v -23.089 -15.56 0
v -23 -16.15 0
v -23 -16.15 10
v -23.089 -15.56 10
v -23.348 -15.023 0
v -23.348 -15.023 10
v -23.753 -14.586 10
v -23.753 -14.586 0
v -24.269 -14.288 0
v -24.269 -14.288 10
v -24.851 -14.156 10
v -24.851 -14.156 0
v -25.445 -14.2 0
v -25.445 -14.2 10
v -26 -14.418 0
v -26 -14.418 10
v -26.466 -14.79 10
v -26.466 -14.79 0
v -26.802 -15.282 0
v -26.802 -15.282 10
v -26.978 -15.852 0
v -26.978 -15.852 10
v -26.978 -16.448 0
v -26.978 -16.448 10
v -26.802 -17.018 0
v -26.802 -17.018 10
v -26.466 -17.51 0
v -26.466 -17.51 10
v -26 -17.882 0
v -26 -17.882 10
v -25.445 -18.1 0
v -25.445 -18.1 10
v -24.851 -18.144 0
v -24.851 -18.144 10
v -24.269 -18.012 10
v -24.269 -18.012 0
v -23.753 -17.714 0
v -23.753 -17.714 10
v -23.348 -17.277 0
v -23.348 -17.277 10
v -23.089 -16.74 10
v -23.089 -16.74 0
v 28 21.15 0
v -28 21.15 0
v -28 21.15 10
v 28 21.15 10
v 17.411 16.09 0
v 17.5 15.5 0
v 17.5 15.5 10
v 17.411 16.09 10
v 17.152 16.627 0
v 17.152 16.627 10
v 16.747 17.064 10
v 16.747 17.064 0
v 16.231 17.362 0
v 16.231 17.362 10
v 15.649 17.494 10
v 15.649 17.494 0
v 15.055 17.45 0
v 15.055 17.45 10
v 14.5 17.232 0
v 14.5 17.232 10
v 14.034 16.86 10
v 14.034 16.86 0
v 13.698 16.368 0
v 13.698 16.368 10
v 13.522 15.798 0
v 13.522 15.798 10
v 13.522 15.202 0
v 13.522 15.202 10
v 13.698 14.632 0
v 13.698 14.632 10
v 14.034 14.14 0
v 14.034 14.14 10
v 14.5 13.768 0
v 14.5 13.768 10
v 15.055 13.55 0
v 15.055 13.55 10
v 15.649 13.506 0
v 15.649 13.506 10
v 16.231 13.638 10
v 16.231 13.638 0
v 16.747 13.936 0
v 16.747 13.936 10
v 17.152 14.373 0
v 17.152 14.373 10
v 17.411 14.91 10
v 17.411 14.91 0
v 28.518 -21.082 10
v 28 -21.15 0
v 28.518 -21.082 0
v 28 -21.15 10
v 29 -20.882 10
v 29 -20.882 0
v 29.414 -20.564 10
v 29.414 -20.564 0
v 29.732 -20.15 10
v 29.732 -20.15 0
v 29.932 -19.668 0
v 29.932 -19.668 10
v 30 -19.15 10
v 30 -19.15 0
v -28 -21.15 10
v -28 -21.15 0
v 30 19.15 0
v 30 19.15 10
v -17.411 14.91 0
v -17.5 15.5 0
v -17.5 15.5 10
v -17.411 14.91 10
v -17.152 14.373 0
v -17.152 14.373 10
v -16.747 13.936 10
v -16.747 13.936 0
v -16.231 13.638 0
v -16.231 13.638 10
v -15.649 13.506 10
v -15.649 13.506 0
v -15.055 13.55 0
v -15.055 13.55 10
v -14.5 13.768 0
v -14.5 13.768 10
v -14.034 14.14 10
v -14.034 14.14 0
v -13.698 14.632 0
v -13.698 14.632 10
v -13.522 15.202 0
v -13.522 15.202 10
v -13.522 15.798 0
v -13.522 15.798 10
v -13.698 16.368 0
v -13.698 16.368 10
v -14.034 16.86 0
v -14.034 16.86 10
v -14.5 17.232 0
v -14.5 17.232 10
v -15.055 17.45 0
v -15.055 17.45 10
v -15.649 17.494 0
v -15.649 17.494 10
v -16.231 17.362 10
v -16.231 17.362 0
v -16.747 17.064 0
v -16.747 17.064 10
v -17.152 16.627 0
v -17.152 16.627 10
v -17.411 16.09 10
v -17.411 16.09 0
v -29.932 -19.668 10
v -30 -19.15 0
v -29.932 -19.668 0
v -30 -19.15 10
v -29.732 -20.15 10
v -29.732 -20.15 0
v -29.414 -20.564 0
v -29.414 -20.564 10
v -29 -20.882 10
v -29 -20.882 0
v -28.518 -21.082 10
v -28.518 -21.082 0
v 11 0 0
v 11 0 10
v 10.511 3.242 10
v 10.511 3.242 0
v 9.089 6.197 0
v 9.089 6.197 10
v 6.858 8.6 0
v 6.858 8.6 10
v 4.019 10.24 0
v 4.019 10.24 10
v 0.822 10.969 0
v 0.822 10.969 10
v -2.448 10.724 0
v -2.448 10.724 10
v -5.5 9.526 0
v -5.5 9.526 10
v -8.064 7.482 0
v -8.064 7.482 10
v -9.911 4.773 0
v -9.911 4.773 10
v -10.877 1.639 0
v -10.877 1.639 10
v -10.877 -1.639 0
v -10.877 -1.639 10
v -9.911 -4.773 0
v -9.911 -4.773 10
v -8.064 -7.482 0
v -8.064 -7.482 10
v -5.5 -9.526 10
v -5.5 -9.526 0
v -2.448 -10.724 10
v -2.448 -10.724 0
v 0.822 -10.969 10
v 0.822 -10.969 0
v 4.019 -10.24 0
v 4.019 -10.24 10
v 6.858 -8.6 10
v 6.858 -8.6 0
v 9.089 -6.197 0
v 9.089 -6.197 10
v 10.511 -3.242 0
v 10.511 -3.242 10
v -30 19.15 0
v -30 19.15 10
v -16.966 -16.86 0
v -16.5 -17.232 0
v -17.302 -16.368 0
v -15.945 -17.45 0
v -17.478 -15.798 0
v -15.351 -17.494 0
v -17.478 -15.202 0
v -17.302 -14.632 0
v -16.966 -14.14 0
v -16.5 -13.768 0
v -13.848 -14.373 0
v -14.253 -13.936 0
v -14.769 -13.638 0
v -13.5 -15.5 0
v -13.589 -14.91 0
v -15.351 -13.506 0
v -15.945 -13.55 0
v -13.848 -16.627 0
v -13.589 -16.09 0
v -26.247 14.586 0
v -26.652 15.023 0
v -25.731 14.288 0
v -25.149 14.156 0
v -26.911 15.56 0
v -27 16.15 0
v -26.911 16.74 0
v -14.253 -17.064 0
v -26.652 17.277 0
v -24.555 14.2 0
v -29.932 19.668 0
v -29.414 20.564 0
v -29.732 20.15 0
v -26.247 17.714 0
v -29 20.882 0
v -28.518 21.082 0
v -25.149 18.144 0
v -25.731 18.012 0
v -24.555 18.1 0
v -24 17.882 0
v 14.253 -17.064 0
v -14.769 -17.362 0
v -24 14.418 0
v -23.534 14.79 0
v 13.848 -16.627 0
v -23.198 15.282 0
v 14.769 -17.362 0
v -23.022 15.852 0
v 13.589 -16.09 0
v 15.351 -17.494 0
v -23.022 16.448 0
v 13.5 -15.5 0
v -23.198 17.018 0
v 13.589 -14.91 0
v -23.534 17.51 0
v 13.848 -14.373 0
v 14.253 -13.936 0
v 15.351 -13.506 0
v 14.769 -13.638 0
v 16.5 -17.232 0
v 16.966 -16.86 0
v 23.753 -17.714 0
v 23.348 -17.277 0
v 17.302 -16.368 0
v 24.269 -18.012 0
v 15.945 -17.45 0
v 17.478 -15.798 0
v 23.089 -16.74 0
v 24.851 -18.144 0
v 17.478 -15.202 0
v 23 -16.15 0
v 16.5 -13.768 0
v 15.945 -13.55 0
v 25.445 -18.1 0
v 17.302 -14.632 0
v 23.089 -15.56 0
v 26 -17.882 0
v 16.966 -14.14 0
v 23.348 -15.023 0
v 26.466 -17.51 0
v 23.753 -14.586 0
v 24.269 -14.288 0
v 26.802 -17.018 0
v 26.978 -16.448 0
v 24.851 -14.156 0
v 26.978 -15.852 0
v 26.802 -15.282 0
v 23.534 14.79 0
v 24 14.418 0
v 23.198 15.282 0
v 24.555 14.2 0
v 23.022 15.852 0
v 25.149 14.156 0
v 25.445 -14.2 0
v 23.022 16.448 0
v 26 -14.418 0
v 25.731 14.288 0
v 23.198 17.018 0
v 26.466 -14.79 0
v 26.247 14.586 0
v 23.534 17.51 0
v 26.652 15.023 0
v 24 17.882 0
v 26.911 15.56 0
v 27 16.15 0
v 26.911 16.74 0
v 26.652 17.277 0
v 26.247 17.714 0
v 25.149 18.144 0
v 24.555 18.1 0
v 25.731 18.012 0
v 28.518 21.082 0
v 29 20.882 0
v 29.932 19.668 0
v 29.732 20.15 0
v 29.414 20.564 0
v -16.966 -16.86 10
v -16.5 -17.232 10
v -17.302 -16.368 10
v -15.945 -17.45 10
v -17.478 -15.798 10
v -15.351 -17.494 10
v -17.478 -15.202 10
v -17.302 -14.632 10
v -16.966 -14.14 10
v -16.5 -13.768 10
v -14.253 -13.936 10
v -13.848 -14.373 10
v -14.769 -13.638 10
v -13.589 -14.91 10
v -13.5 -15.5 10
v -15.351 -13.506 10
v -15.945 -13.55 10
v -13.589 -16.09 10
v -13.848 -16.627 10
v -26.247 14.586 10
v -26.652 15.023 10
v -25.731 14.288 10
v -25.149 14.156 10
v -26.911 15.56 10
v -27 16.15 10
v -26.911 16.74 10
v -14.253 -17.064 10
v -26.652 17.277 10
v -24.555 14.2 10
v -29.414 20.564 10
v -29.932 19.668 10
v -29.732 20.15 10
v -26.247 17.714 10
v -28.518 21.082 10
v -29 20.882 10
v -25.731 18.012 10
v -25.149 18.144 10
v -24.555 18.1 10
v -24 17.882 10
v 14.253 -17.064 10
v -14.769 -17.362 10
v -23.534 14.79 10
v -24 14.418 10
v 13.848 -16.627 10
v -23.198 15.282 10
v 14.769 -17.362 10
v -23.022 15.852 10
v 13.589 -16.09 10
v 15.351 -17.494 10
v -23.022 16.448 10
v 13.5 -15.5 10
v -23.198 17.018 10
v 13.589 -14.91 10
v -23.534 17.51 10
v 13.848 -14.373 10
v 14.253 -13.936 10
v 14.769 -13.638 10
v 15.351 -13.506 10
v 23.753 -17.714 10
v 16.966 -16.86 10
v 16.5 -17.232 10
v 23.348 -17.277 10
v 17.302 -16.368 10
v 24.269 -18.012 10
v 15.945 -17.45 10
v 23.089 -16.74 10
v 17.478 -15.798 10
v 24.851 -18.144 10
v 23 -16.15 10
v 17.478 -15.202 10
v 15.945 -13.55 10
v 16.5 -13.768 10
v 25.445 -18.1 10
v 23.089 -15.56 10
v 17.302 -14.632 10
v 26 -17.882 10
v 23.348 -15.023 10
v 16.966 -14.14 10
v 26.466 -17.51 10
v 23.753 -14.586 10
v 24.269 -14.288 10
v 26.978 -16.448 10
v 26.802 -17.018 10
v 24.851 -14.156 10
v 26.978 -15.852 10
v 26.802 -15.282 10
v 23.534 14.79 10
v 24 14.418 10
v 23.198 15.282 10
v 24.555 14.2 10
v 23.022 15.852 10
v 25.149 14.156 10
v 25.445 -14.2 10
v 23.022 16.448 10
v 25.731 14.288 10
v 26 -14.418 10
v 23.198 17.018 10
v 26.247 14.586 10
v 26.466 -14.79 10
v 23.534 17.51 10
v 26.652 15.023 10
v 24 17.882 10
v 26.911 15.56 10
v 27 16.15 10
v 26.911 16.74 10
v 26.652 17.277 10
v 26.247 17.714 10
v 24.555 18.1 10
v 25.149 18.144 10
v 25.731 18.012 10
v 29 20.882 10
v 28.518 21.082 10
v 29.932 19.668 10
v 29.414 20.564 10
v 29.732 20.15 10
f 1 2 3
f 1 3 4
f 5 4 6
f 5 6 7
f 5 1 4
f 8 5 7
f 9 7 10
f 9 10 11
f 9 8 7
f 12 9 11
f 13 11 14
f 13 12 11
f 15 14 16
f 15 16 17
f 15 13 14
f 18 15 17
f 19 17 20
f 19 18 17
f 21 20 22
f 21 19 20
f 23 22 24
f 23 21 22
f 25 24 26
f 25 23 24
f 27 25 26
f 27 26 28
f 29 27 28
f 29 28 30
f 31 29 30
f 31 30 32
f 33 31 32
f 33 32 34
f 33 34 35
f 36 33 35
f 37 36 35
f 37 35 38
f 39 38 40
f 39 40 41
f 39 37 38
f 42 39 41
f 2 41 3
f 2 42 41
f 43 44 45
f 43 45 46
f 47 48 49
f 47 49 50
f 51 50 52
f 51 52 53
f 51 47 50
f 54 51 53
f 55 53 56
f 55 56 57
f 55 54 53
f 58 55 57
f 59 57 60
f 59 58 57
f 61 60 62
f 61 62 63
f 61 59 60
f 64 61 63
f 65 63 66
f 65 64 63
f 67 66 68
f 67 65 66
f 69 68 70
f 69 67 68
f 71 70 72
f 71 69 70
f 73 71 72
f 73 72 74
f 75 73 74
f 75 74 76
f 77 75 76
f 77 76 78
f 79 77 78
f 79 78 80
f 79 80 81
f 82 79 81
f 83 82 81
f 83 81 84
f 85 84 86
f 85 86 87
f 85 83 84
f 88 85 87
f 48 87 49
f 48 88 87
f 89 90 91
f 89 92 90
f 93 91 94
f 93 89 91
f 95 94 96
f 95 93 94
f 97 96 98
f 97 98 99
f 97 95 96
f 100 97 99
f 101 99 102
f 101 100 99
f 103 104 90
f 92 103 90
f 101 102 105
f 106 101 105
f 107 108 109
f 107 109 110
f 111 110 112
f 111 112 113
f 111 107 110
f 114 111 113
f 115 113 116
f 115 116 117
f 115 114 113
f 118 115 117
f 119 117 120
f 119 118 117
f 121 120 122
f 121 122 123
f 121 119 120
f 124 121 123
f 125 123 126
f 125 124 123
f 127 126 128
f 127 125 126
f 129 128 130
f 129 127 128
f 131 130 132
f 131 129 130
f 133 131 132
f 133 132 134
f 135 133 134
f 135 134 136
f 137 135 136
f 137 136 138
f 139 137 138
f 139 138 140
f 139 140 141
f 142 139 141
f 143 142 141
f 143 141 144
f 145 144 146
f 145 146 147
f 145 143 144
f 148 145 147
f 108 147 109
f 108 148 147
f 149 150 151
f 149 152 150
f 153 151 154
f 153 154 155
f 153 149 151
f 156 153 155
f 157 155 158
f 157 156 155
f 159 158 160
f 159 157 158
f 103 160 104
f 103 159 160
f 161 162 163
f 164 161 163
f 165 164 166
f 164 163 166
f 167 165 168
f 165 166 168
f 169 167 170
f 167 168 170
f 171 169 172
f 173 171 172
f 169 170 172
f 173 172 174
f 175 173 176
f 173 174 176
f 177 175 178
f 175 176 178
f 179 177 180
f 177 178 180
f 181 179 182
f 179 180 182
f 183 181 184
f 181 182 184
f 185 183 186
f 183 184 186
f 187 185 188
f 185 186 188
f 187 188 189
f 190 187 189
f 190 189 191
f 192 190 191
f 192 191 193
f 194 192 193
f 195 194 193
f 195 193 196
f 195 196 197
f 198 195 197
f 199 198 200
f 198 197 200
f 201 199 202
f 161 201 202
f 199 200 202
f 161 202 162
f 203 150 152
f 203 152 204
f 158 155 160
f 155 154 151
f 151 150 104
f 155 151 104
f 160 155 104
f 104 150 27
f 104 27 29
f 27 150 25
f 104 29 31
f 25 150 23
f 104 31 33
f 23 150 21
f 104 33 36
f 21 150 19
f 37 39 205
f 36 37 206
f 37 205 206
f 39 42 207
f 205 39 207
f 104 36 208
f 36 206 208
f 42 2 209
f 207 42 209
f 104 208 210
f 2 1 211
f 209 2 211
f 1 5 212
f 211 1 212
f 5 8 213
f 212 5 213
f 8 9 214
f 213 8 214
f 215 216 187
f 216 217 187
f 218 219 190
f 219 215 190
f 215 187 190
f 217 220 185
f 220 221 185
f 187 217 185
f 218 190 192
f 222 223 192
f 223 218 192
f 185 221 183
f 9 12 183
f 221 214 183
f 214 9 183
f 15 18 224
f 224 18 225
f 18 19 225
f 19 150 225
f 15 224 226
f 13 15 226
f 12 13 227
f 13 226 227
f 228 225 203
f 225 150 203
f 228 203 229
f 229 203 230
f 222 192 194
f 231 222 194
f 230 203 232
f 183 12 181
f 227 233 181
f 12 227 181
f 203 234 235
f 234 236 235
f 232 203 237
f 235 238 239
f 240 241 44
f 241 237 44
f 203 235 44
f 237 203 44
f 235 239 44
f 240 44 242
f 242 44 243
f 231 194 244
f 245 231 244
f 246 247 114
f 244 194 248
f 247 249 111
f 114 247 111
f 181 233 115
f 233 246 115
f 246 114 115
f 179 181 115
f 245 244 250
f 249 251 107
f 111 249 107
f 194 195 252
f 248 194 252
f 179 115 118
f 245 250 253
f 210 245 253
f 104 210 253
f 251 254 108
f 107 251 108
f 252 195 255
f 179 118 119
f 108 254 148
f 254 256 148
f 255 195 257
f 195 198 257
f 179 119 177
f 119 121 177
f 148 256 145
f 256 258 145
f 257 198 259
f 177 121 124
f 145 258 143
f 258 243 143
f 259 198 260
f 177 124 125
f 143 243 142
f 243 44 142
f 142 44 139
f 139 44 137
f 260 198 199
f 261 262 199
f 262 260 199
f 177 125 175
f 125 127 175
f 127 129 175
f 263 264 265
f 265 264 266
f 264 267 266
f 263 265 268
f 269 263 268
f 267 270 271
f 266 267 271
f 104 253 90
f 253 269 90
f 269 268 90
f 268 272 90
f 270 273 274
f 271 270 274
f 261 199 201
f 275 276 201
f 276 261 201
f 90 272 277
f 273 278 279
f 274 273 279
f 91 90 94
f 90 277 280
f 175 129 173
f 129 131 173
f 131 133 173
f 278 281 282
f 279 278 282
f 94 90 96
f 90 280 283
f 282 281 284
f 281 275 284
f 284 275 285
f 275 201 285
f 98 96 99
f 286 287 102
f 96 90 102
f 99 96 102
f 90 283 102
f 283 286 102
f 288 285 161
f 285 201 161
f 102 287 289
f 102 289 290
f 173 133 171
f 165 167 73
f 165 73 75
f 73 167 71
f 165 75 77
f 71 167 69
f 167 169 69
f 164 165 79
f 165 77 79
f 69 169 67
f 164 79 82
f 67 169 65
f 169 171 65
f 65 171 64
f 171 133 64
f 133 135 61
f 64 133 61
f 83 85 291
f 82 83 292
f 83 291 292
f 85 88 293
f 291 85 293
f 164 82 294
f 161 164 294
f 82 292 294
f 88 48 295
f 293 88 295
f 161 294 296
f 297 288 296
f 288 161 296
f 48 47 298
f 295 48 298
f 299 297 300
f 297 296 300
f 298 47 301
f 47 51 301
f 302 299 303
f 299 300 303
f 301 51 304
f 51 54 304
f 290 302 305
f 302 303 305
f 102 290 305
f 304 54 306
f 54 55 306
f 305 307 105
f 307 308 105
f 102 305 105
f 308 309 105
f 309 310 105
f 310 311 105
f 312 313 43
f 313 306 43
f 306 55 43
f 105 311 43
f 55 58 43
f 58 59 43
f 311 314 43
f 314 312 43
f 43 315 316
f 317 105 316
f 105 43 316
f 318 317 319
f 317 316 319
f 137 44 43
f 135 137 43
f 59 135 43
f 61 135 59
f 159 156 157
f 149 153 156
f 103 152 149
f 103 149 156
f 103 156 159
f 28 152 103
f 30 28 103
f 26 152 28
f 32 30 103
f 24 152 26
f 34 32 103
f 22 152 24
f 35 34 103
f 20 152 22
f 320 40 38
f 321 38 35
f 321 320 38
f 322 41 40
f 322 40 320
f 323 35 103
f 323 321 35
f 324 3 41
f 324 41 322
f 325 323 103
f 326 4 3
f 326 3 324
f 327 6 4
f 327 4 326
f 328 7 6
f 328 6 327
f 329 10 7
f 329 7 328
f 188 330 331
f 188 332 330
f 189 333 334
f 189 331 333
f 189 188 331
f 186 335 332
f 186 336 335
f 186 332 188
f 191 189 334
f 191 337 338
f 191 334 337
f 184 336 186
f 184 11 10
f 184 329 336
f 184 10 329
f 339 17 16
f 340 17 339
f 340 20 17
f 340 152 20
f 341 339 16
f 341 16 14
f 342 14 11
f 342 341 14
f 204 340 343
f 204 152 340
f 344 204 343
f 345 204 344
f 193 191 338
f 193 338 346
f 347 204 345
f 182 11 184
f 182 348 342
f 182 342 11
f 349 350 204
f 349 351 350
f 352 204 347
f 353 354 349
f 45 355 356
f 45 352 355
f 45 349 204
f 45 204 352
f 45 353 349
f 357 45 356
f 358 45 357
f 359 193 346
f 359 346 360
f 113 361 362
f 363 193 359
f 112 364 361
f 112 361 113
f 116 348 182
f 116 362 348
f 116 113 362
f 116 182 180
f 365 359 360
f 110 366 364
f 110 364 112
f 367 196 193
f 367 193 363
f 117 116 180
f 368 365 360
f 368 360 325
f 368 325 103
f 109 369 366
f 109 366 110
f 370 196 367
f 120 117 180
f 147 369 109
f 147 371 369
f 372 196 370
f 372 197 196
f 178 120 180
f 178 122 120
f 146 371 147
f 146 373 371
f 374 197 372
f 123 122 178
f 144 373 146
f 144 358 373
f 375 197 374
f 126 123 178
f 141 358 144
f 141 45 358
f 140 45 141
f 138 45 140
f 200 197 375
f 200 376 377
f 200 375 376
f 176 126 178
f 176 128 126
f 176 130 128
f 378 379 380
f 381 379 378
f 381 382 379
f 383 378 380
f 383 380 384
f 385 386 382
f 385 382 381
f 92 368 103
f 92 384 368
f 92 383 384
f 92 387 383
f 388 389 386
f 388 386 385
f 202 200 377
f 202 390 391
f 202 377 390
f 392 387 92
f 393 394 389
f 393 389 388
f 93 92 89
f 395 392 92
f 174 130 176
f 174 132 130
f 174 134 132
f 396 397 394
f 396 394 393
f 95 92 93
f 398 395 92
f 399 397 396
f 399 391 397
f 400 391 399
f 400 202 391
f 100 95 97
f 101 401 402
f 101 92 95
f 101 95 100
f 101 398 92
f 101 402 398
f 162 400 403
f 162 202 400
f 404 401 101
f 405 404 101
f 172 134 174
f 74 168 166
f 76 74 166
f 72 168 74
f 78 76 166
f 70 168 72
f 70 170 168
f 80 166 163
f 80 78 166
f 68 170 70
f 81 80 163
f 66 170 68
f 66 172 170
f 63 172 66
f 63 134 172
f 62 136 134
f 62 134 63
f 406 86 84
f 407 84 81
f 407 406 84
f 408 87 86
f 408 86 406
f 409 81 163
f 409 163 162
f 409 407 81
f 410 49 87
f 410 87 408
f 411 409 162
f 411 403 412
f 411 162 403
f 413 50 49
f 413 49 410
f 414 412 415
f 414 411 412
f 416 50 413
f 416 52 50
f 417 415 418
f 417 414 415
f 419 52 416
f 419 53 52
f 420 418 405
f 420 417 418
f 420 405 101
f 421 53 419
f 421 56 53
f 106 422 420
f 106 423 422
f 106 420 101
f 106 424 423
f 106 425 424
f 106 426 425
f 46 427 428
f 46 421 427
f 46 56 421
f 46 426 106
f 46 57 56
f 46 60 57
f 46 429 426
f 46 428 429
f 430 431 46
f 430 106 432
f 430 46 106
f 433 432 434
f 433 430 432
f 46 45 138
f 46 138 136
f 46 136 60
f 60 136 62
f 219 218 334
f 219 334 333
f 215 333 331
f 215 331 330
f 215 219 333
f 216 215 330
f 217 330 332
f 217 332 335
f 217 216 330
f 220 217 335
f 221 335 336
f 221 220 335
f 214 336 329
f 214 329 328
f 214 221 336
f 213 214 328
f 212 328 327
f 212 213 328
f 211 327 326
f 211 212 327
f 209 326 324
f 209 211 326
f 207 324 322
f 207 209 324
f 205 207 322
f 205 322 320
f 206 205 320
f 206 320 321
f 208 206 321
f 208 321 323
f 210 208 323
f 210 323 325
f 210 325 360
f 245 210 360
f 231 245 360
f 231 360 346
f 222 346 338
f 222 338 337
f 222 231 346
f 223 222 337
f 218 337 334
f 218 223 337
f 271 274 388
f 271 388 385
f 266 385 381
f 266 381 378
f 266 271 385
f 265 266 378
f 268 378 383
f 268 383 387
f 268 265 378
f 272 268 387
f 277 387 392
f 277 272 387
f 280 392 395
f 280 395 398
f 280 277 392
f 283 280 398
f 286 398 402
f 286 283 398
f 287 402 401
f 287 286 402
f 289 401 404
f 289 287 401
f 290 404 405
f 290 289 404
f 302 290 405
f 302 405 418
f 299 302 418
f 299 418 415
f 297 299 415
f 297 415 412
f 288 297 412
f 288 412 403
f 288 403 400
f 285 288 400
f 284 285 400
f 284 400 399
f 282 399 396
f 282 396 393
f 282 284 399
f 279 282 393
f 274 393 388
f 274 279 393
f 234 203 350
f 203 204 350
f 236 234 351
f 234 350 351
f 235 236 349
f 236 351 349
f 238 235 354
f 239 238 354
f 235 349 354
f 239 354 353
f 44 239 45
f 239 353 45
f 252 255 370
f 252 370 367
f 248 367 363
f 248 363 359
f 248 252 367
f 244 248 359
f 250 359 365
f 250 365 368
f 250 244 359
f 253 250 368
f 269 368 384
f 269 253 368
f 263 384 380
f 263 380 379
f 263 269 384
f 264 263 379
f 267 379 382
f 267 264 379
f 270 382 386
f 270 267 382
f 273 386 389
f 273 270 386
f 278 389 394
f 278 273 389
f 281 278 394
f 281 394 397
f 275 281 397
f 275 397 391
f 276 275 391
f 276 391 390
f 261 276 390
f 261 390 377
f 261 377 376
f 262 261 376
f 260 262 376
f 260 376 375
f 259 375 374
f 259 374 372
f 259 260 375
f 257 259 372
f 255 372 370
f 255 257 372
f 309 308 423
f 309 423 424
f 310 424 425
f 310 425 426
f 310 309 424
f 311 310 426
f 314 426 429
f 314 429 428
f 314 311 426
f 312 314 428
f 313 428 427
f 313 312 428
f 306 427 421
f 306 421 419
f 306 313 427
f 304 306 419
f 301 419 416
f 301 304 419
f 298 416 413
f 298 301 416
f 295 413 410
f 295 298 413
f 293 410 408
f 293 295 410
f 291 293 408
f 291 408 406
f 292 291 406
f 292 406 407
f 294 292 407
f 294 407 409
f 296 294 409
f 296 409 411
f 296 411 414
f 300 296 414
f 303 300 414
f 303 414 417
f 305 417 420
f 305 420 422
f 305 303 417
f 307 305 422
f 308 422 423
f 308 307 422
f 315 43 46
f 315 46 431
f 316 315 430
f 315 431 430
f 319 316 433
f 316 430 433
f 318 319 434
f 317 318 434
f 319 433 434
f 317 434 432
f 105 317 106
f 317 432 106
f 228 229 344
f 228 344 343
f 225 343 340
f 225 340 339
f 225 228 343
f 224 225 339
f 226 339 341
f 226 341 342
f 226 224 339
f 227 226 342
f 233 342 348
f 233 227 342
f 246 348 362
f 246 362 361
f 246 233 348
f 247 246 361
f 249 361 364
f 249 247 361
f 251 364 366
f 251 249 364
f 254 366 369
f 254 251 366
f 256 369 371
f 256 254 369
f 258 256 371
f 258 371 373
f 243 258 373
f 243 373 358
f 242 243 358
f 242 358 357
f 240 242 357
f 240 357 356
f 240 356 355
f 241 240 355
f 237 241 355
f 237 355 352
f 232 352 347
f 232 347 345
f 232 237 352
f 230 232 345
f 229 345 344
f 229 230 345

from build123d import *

# Parameters (mm, degrees)
ESQUISSE1_W             = 60
ESQUISSE1_H             = 42.3
ESQUISSE1_R             = 2
BOSS_EXTRU_1_DEPTH      = 10
ESQUISSE2_R             = 11
ENL_V_MAT_EXTRU_1_DEPTH = 10
CONG_1_R                = 2


with BuildPart() as part:
    # Esquisse1 → Boss.-Extru.1 (new body)
    with BuildSketch(Plane.XY):
        Rectangle(ESQUISSE1_W, ESQUISSE1_H)
        with Locations((15.5, 15.5)):
            Circle(ESQUISSE1_R, mode=Mode.SUBTRACT)
        with Locations(Location((-15.5, 15.5, 0), (0, 0, 180))):
            Circle(ESQUISSE1_R, mode=Mode.SUBTRACT)
        with Locations(Location((15.5, -15.5, 0), (0, 0, 180))):
            Circle(ESQUISSE1_R, mode=Mode.SUBTRACT)
        with Locations((-15.5, -15.5)):
            Circle(ESQUISSE1_R, mode=Mode.SUBTRACT)
        with Locations((25, 16.15)):
            Circle(ESQUISSE1_R, mode=Mode.SUBTRACT)
        with Locations(Location((-25, 16.15, 0), (0, 0, 180))):
            Circle(ESQUISSE1_R, mode=Mode.SUBTRACT)
        with Locations((-25, -16.15)):
            Circle(ESQUISSE1_R, mode=Mode.SUBTRACT)
        with Locations(Location((25, -16.15, 0), (0, 0, 180))):
            Circle(ESQUISSE1_R, mode=Mode.SUBTRACT)
    extrude(amount=BOSS_EXTRU_1_DEPTH)

    # Esquisse2 → Enlèv. mat.-Extru.1 (cut)
    with BuildSketch(Plane.XY.offset(10)):
        Circle(ESQUISSE2_R)
    extrude(amount=-ENL_V_MAT_EXTRU_1_DEPTH, mode=Mode.SUBTRACT)

    # Congé1
    cong_1_edges = [part.edges().sort_by_distance(p)[0] for p in [
        (30, -21.15, 5),
        (-30, -21.15, 5),
        (-30, 21.15, 5),
        (30, 21.15, 5),
    ]]
    fillet(cong_1_edges, radius=CONG_1_R)


solid = part.part
